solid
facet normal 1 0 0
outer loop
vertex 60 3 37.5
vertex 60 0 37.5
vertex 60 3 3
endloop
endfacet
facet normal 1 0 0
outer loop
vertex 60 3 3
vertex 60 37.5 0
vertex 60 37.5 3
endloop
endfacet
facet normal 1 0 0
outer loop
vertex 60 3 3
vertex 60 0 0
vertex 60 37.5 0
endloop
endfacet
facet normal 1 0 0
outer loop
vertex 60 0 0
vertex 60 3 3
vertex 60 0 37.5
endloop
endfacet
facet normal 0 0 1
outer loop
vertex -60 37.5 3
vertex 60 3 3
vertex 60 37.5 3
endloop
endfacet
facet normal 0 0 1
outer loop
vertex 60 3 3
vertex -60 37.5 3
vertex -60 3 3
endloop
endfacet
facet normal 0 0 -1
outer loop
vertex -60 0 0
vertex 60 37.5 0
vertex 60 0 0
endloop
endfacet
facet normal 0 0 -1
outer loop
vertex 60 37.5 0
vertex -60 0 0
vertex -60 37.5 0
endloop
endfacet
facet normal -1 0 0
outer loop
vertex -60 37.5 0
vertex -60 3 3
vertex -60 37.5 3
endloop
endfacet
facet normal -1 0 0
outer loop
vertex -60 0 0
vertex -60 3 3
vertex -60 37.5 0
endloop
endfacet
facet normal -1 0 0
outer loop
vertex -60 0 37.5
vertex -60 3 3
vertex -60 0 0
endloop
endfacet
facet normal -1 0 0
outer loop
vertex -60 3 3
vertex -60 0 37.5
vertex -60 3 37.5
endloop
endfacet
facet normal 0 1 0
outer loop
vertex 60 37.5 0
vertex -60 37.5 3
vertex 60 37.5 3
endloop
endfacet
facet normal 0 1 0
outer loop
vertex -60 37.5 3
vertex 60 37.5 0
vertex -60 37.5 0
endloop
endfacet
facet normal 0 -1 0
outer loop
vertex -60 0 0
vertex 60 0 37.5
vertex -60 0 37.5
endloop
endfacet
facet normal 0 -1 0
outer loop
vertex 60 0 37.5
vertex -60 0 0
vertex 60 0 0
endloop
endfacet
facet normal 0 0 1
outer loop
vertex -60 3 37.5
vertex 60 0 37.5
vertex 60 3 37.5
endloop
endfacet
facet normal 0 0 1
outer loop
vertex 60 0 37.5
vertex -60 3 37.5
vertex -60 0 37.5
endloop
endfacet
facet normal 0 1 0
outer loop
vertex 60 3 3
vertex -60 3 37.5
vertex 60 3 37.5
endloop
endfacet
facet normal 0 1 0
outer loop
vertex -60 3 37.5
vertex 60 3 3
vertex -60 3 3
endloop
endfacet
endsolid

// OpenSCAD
// file: Variables/Threading.scad
// created by IndiePandaaaaa | Lukas

// source M3-M12: https://de.wikipedia.org/wiki/Kernloch
// source UNC14: https://www.thommel.de/de/artikel/werkzeuge,80,format-hsse-maschinengewindebohrer,3017680017/
// source UNC38:https://www.thommel.de/de/artikel/werkzeuge,80,format-hsse-maschinengewindebohrer,3017680021/

// UNC14 => UNC 1/4″ 20  |   UNC38 => UNC 3/8″ 16

core_holes = [
    ["M3", 2.5],
    ["M4", 3.3],
    ["M5", 4.2],
    ["M6", 5.0],
    ["M8", 6.8],
    ["M10", 8.5],
    ["M12", 10.2],
    ["UNC14", 5.1],
    ["UNC38", 8.0],
  ];

function core_hole(name) = core_holes[search([name], core_holes, num_returns_per_match = 1, index_col_num = 0)[0]][1];

function core_hole_M3() = core_hole("M3");

function core_hole_M4() = core_hole("M4");

function core_hole_M5() = core_hole("M5");

function core_hole_M6() = core_hole("M6");

function core_hole_M8() = core_hole("M8");

function core_hole_M10() = core_hole("M10");

function core_hole_M12() = core_hole("M12");

function core_hole_UNC14() = core_hole("UNC14");

function core_hole_UNC38() = core_hole("UNC38");
// file: Structures/Hexagon.scad
// created by IndiePandaaaaa | Lukas

function hexagon_get_inner_diameter(single_outer_diameter = 20) = tan(60) * (single_outer_diameter / 2);

function hexagon_inbetween_distance_x(single_outer_diameter = 20) = single_outer_diameter -
  hexagon_get_inner_diameter(single_outer_diameter);

function hexagon_get_y_inner_element_additional_height(single_outer_diameter = 20) = single_outer_diameter / 2 +
    hexagon_inbetween_distance_x(single_outer_diameter) * cos(30) + (single_outer_diameter / 2) * cos(60);

function hexagon_get_y_outer_element_height(single_outer_diameter = 20) = single_outer_diameter;

function hexagon_get_y_next_structure(single_outer_diameter = 20) = (single_outer_diameter / 2 * 3) +
      hexagon_inbetween_distance_x(single_outer_diameter) * cos(30) * 2;

function hexagon_get_y_element_height(single_outer_diameter = 20) =
  hexagon_get_y_outer_element_height(single_outer_diameter) +
  hexagon_get_y_inner_element_additional_height(single_outer_diameter);

function hexagon_get_x_element_count(width, single_outer_diameter = 20) = floor(width / single_outer_diameter);

function hexagon_get_y_element_count(depth, single_outer_diameter = 20) = floor(((depth -
  (hexagon_get_y_element_height(single_outer_diameter) - hexagon_get_y_next_structure(single_outer_diameter))) /
  hexagon_get_y_next_structure(single_outer_diameter)) * 2);

function hexagon_get_used_width(width, single_outer_diameter = 20) = single_outer_diameter *
  hexagon_get_x_element_count(width, single_outer_diameter) - hexagon_inbetween_distance_x(single_outer_diameter);

function hexagon_get_used_depth(depth, single_outer_diameter = 20) = round(hexagon_get_y_element_count(depth,
single_outer_diameter) / 2) * hexagon_get_y_outer_element_height(single_outer_diameter) +
    floor(hexagon_get_y_element_count(depth, single_outer_diameter) / 2) * (hexagon_get_y_next_structure(
  single_outer_diameter) - single_outer_diameter) +
      (hexagon_get_y_element_count(depth, single_outer_diameter) + 1) % 2 * (hexagon_get_y_element_height(
  single_outer_diameter) - hexagon_get_y_next_structure(single_outer_diameter));

module hexagon_pattern(width, depth, thickness, single_outer_diameter = 20, vertices = 6) {
  inner_diameter = hexagon_get_inner_diameter(single_outer_diameter);

  count_x = hexagon_get_x_element_count(width, single_outer_diameter);
  count_y = hexagon_get_y_element_count(depth, single_outer_diameter);

  angle = 360 / vertices * 1.5;

  for (y = [0:count_y - 1]) {
    for (x = [0:count_x - 1]) {

      if (y % 2 == 0) {
        translate([inner_diameter / 2 + single_outer_diameter * x, (single_outer_diameter / 2) + inner_diameter
          * y, -0.01]) {
          linear_extrude(height = thickness + 0.02) {
            rotate([0, 0, angle]) circle(d = single_outer_diameter, $fn = vertices);
          }
        }
      } else if (x < count_x - 1) {
        translate([inner_diameter / 2 + single_outer_diameter * x + single_outer_diameter / 2,
            (single_outer_diameter / 2) + inner_diameter * y, -0.01]) {
          linear_extrude(height = thickness + 0.02) {
            rotate([0, 0, angle]) circle(d = single_outer_diameter, $fn = vertices);
          }
        }
      }

    }
  }
}

width = 100;
depth = 100;
difference() {
  cube([width, depth, 3]);
  translate([(width - hexagon_get_used_width(width)) / 2, (depth - hexagon_get_used_depth(depth)) / 2, 0])
    hexagon_pattern(width, depth, 3);
}
// file: Parts/Screw.scad
// created by IndiePandaaaaa | Lukas

TOLERANCE = .1;
$fn = $preview ? 30 : 75;

// metric standards                          M1   M2   M3   M4   M5 M6 M7   M8   M9  M10
function screw_metric_corehole(standard) = [.75, 1.6, 2.5, 3.3, 4.2, 5, 6, 6.8, 7.8, 8.5][standard - 1];
function screw_metric_borehole(standard) = [0, 0, 3.4, 4.5, 5.5, 6.6, 0, 9, 0, 11][standard - 1];
function screw_metric_countersunk_height(standard) = [0, 0, 1.7, 2.3, 2.8, 3.3, 0, 4.4, 0, 5.5][standard - 1];
function screw_metric_countersunk_od(standard) = standard * 2;

module screw_metric_countersunk(standard, length, unthreaded_length = 0, borehole_length = 0, tolerance = .15) {
  if (screw_metric_corehole(standard=standard) == 0) echo("ERROR: screw_metric_corehole value has not been set yet.");
  if (screw_metric_borehole(standard=standard) == 0) echo("ERROR: screw_metric_borehole value has not been set yet.");
  if (screw_metric_countersunk_height(standard=standard) == 0) echo("ERROR: screw_metric_countersunk_height value has not been set yet.");

  union() {
    translate(v=[0, 0, -.1]) {
      cylinder(h=.2 + borehole_length, d=screw_metric_countersunk_od(standard) + tolerance, center=false);
      translate(v=[0, 0, -screw_metric_countersunk_height(standard)]) {
        cylinder(h=screw_metric_countersunk_height(standard) + .01, d2=screw_metric_countersunk_od(standard) + tolerance, d1=screw_metric_borehole(standard) + tolerance, center=false);
        translate(v=[0, 0, -.1]) cylinder(h=.1, d=screw_metric_borehole(standard) + tolerance, center=false);
      }
    }
    translate(v=[0, 0, -length]) cylinder(h=length, d=screw_metric_corehole(standard) + tolerance, center=false);

    // unthreaded part
    translate(v=[0, 0, -.1 - screw_metric_countersunk_height(standard) - unthreaded_length]) cylinder(h=unthreaded_length + .1, d=screw_metric_borehole(standard) + tolerance, center=false);
  }
}

// TODO: module metric cylindric head screws

// TODO: module metric rounded head screws

function screw_wood_corehole(diameter) = diameter * 0.75;
function screw_wood_borehole(diameter) = diameter * 1.25;
function screw_wood_countersunk_height(diameter) = diameter * 0.75;

module screw_wood_countersunk(diameter, length, unthreaded_length = 0, tolerance = .15) {
  if (screw_metric_corehole(standard=standard) == 0) echo("ERROR: screw_metric_corehole value has not been set yet.");
  if (screw_metric_borehole(standard=standard) == 0) echo("ERROR: screw_metric_borehole value has not been set yet.");
  if (screw_metric_countersunk_height(standard=standard) == 0) echo("ERROR: screw_metric_countersunk_height value has not been set yet.");

  // TODO: add module for wood screws 
  union(){}
}

// TODO: module wood cylindric head screws

// TODO: module wood rounded head screws

function cone_diameter(diameter) = diameter * 2;
function cone_diameter_cutout(diameter) = diameter * 2 + 0.5;
function cone_height(diameter) = diameter * 0.75;

module screw(diameter, length = 12, cutout_sample = false) {
  module base_model(diameter, length, cone_height, cone_diameter, offset = 0) {
    rotate_extrude(angle=360) {
      polygon(
        [
          [0, 0],
          [(diameter + offset) / 2, 0],
          [(diameter + offset) / 2, (length + offset) - (cone_height + offset)],
          [(cone_diameter + offset) / 2, length + offset],
          [0, length + offset],
        ]
      );
    }
  }

  if (length < diameter) {
    echo("Screw is too short");
    length = diameter + 5;
    echo("New length is: ", length);
  }

  if (!cutout_sample) {
    translate([0, 0, -length])
      difference() {
        base_model(diameter, length, cone_height(diameter), cone_diameter(diameter));

        // top cross part
        translate([0, 0, length - (cone_height(diameter) - diameter / 2) + .1])
          difference() {
            rotate([0, 0, 45])
              rotate_extrude(angle=360) {
                polygon(
                  [
                    [0, 0],
                    [diameter * 1.4 / 2, 0],
                    [cone_diameter(diameter) / 3, cone_height(diameter) - diameter / 2],
                    [0, cone_height(diameter) - diameter / 2],
                  ]
                );
              }
            for (i = [0:1:3]) {
              rotate([0, 0, 90 * i])
                translate([diameter / 3.18 / 2, diameter / 3.18 / 2, 0]) cube(cone_height(diameter));
            }
          }
      }
  } else {
    offset = 0;
    diameter = cone_diameter_cutout(diameter) / 2; // is duplicated by function, used to reduce error
    translate([0, 0, -length - offset / 2]) {
      base_model(diameter, length, cone_height(diameter), cone_diameter(diameter), offset);
      translate([0, 0, length - .005]) cylinder(r=diameter, h=50);
    }
  }
}

module screw_corehole(diameter_screw, diameter_core, unthreaded_length, length = 12) {
  union() {
    screw(diameter=diameter_screw, length=unthreaded_length, cutout_sample=true);
    if (unthreaded_length < diameter_core - .1) {
      translate(v=[0, 0, -diameter_screw * .8]) cylinder(h=diameter_screw, d=diameter_screw + .3, center=false);
    }
    translate([0, 0, -length]) cylinder(d=diameter_core, h=length - unthreaded_length + .1);
  }
}

module screw_with_nut(screw_length, diameter, square_channel = false, tolerance = .1) {
  function od(width) = ( (width / 2) / cos(30)) * 2; // calculates nut diameter from given width
  nut_thickness = [0.8, 1.6, 2.4, 3.2, 4, 5, 5.5, 6.5];
  nut_width = [2.5, 4, 5.5, 7.1, 8.1, 10.1, 11.1, 13.1];

  if (!(0 < diameter && diameter <= 8 && diameter == round(diameter))) {
    echo("module is only defined for integer values from M1 to M8.");
  } else {
    union() {
      if (!square_channel) {
        screw(diameter=diameter, length=screw_length, cutout_sample=true);

        translate([0, 0, -(screw_length * 2 - nut_thickness[diameter - 1])])
          cylinder(d=od(nut_width[diameter - 1]) + tolerance, h=screw_length, $fn=6);
      } else {
        screw(diameter=diameter, length=screw_length + diameter, cutout_sample=true);
        translate([-od(nut_width[diameter - 1]) / 2 - tolerance, -(nut_width[diameter - 1] / 2), -(screw_length)])
          cube([od(nut_width[diameter - 1]) + screw_length, nut_width[diameter - 1] + tolerance, nut_thickness[diameter - 1] + tolerance]);
      }
    }
  }
}

translate(v=[0, 0, 0]) screw(diameter=3.5, length=12, cutout_sample=false);
translate(v=[20, 0, 0]) screw_corehole(diameter_screw=3, diameter_core=2.5, unthreaded_length=15, length=20);
translate(v=[40, 0, 0]) screw_with_nut(screw_length=30, diameter=4, square_channel=false, tolerance=.1);
translate(v=[60, 0, 0]) SCREW_METRIC_COUNTERSUNK(standard=3, length=12, unthreaded_length=5, borehole_length=5);
// main file
// created by IndiePandaaaaa

use <Parts/Screw.scad>
use <Structures/Hexagon.scad>
use <Variables/Threading.scad>

MODEL_TOLERANCE = 0.15;
MATERIAL_THICKNESS = 3.5;
$fn = $preview ? 25 : 125;

DISTANCES = [[140, 125], [120, 105], [80, 71.5]];

module pc_fan_stand(fan_diameter, fan_screw_distance, fan_depth = 25, front_overhang = 0, stand_height_offset = 5, thickness = 3) {
  screw_diameter = 5.2;
  stand_depth = fan_depth * 1.5;

  translate(v=[-fan_diameter / 2, 0, 0]) {
    cube(size=[fan_diameter, stand_depth, thickness], center=false);
    cube(size=[fan_diameter, thickness, stand_depth], center=false);
  }
}

pc_fan_stand(fan_diameter=120, fan_screw_distance=105);

module fan_stand(FAN_DIAMETER, FAN_SCREW_DISTANCE, FAN_DEPTH = 25) {
  STAND_DEPTH = FAN_DEPTH / 2 * 3;
  FRONT_OVERHANG = FAN_DEPTH / 5 * 0; // optionally

  SCREW_OFFSET = (FAN_DIAMETER - FAN_SCREW_DISTANCE) / 2;
  SCREW_DIAMETER = 5.2; // the hole in the fan has the diameter 4.3 mm
  HEIGHT_FROM_FLOOR = 5;

  M3_HOLE = core_hole_M3();
  UNC14_HOLE = core_hole_UNC14();

  UNC14_EDGE_OFFSET = 1.5;

  difference() {
    rotate([90, 0, 90])
      linear_extrude(height=FAN_DIAMETER) {
        polygon(
          [
            [0, 0],
            [STAND_DEPTH, 0],
            [STAND_DEPTH, MATERIAL_THICKNESS],
            [MATERIAL_THICKNESS + FRONT_OVERHANG, MATERIAL_THICKNESS],
            [MATERIAL_THICKNESS + FRONT_OVERHANG, MATERIAL_THICKNESS + SCREW_OFFSET * 2 + HEIGHT_FROM_FLOOR],
            [FRONT_OVERHANG, MATERIAL_THICKNESS + SCREW_OFFSET * 2 + HEIGHT_FROM_FLOOR],
            [FRONT_OVERHANG, MATERIAL_THICKNESS],
            [0, MATERIAL_THICKNESS],
          ]
        );
      }

    // front fan cutout
    translate([FAN_DIAMETER / 2, FAN_DEPTH + 0.1, FAN_DIAMETER / 2 + MATERIAL_THICKNESS + HEIGHT_FROM_FLOOR])
      rotate([90, 0, 0])
        cylinder(h=FAN_DEPTH + 0.2, d=FAN_DIAMETER);

    for (i = [0:1]) {
      translate(
        [
          SCREW_OFFSET + FAN_SCREW_DISTANCE * i,
          FRONT_OVERHANG / 2 - 0.1 - MATERIAL_THICKNESS / 2,
          MATERIAL_THICKNESS + HEIGHT_FROM_FLOOR + SCREW_OFFSET,
        ]
      )
        rotate([90, 0, 0]) screw(SCREW_DIAMETER, FAN_DEPTH + 0.2, true);

      // core holes M3
      translate([0, FRONT_OVERHANG + MATERIAL_THICKNESS + M3_HOLE, -0.1]) {
        translate([SCREW_OFFSET + FAN_SCREW_DISTANCE * i, 0, 0])
          cylinder(h=MATERIAL_THICKNESS + 0.2, d=M3_HOLE);

        if (FAN_DIAMETER == 80 || FAN_DIAMETER == 120) {
          translate([FAN_DIAMETER / 3 * (i + 1), UNC14_EDGE_OFFSET, 0])
            cylinder(d=UNC14_HOLE, h=MATERIAL_THICKNESS + 0.2);
        }
        if (FAN_DIAMETER == 140) {
          translate([FAN_DIAMETER / 2.8 + FAN_DIAMETER / 3.5 * i, UNC14_EDGE_OFFSET, 0])
            cylinder(d=UNC14_HOLE, h=MATERIAL_THICKNESS + 0.2);
        }
      }

      border_offset = 5;
      translate([border_offset + i * (FAN_DIAMETER - border_offset * 2), 12, MATERIAL_THICKNESS + .1]) screw(
          3.5, 12,
          true
        );
    }

    HEX_OD = FAN_DEPTH - (FAN_DEPTH / 5) - MATERIAL_THICKNESS - 3;
    usable_depth = STAND_DEPTH - FRONT_OVERHANG - MATERIAL_THICKNESS - (UNC14_HOLE - UNC14_EDGE_OFFSET);
    usable_width = FAN_DIAMETER - 4;
    translate(
      [
        (FAN_DIAMETER - hexagon_get_used_width(usable_width, HEX_OD)) / 2,
        FRONT_OVERHANG + MATERIAL_THICKNESS + (HEX_OD - hexagon_get_used_width(usable_depth, HEX_OD)) / 2,
        0,
      ]
    )
      rotate([180, 0, 0])
        translate([0, -FRONT_OVERHANG - MATERIAL_THICKNESS - 2 - usable_depth, -MATERIAL_THICKNESS])
          hexagon_pattern(usable_width, usable_depth, MATERIAL_THICKNESS, HEX_OD);
  }
}

// tested for diameters 80, 120, 140
// DIAMETER -> DISTANCE: 140 -> 125 | 120 -> 105 | 80 -> 71.5

//translate([0, 50, 0]) fan_stand(80, 71.5);
//translate([0, 100, 0]) fan_stand(120, 105);
//translate([0, 150, 0]) fan_stand(140, 125);
